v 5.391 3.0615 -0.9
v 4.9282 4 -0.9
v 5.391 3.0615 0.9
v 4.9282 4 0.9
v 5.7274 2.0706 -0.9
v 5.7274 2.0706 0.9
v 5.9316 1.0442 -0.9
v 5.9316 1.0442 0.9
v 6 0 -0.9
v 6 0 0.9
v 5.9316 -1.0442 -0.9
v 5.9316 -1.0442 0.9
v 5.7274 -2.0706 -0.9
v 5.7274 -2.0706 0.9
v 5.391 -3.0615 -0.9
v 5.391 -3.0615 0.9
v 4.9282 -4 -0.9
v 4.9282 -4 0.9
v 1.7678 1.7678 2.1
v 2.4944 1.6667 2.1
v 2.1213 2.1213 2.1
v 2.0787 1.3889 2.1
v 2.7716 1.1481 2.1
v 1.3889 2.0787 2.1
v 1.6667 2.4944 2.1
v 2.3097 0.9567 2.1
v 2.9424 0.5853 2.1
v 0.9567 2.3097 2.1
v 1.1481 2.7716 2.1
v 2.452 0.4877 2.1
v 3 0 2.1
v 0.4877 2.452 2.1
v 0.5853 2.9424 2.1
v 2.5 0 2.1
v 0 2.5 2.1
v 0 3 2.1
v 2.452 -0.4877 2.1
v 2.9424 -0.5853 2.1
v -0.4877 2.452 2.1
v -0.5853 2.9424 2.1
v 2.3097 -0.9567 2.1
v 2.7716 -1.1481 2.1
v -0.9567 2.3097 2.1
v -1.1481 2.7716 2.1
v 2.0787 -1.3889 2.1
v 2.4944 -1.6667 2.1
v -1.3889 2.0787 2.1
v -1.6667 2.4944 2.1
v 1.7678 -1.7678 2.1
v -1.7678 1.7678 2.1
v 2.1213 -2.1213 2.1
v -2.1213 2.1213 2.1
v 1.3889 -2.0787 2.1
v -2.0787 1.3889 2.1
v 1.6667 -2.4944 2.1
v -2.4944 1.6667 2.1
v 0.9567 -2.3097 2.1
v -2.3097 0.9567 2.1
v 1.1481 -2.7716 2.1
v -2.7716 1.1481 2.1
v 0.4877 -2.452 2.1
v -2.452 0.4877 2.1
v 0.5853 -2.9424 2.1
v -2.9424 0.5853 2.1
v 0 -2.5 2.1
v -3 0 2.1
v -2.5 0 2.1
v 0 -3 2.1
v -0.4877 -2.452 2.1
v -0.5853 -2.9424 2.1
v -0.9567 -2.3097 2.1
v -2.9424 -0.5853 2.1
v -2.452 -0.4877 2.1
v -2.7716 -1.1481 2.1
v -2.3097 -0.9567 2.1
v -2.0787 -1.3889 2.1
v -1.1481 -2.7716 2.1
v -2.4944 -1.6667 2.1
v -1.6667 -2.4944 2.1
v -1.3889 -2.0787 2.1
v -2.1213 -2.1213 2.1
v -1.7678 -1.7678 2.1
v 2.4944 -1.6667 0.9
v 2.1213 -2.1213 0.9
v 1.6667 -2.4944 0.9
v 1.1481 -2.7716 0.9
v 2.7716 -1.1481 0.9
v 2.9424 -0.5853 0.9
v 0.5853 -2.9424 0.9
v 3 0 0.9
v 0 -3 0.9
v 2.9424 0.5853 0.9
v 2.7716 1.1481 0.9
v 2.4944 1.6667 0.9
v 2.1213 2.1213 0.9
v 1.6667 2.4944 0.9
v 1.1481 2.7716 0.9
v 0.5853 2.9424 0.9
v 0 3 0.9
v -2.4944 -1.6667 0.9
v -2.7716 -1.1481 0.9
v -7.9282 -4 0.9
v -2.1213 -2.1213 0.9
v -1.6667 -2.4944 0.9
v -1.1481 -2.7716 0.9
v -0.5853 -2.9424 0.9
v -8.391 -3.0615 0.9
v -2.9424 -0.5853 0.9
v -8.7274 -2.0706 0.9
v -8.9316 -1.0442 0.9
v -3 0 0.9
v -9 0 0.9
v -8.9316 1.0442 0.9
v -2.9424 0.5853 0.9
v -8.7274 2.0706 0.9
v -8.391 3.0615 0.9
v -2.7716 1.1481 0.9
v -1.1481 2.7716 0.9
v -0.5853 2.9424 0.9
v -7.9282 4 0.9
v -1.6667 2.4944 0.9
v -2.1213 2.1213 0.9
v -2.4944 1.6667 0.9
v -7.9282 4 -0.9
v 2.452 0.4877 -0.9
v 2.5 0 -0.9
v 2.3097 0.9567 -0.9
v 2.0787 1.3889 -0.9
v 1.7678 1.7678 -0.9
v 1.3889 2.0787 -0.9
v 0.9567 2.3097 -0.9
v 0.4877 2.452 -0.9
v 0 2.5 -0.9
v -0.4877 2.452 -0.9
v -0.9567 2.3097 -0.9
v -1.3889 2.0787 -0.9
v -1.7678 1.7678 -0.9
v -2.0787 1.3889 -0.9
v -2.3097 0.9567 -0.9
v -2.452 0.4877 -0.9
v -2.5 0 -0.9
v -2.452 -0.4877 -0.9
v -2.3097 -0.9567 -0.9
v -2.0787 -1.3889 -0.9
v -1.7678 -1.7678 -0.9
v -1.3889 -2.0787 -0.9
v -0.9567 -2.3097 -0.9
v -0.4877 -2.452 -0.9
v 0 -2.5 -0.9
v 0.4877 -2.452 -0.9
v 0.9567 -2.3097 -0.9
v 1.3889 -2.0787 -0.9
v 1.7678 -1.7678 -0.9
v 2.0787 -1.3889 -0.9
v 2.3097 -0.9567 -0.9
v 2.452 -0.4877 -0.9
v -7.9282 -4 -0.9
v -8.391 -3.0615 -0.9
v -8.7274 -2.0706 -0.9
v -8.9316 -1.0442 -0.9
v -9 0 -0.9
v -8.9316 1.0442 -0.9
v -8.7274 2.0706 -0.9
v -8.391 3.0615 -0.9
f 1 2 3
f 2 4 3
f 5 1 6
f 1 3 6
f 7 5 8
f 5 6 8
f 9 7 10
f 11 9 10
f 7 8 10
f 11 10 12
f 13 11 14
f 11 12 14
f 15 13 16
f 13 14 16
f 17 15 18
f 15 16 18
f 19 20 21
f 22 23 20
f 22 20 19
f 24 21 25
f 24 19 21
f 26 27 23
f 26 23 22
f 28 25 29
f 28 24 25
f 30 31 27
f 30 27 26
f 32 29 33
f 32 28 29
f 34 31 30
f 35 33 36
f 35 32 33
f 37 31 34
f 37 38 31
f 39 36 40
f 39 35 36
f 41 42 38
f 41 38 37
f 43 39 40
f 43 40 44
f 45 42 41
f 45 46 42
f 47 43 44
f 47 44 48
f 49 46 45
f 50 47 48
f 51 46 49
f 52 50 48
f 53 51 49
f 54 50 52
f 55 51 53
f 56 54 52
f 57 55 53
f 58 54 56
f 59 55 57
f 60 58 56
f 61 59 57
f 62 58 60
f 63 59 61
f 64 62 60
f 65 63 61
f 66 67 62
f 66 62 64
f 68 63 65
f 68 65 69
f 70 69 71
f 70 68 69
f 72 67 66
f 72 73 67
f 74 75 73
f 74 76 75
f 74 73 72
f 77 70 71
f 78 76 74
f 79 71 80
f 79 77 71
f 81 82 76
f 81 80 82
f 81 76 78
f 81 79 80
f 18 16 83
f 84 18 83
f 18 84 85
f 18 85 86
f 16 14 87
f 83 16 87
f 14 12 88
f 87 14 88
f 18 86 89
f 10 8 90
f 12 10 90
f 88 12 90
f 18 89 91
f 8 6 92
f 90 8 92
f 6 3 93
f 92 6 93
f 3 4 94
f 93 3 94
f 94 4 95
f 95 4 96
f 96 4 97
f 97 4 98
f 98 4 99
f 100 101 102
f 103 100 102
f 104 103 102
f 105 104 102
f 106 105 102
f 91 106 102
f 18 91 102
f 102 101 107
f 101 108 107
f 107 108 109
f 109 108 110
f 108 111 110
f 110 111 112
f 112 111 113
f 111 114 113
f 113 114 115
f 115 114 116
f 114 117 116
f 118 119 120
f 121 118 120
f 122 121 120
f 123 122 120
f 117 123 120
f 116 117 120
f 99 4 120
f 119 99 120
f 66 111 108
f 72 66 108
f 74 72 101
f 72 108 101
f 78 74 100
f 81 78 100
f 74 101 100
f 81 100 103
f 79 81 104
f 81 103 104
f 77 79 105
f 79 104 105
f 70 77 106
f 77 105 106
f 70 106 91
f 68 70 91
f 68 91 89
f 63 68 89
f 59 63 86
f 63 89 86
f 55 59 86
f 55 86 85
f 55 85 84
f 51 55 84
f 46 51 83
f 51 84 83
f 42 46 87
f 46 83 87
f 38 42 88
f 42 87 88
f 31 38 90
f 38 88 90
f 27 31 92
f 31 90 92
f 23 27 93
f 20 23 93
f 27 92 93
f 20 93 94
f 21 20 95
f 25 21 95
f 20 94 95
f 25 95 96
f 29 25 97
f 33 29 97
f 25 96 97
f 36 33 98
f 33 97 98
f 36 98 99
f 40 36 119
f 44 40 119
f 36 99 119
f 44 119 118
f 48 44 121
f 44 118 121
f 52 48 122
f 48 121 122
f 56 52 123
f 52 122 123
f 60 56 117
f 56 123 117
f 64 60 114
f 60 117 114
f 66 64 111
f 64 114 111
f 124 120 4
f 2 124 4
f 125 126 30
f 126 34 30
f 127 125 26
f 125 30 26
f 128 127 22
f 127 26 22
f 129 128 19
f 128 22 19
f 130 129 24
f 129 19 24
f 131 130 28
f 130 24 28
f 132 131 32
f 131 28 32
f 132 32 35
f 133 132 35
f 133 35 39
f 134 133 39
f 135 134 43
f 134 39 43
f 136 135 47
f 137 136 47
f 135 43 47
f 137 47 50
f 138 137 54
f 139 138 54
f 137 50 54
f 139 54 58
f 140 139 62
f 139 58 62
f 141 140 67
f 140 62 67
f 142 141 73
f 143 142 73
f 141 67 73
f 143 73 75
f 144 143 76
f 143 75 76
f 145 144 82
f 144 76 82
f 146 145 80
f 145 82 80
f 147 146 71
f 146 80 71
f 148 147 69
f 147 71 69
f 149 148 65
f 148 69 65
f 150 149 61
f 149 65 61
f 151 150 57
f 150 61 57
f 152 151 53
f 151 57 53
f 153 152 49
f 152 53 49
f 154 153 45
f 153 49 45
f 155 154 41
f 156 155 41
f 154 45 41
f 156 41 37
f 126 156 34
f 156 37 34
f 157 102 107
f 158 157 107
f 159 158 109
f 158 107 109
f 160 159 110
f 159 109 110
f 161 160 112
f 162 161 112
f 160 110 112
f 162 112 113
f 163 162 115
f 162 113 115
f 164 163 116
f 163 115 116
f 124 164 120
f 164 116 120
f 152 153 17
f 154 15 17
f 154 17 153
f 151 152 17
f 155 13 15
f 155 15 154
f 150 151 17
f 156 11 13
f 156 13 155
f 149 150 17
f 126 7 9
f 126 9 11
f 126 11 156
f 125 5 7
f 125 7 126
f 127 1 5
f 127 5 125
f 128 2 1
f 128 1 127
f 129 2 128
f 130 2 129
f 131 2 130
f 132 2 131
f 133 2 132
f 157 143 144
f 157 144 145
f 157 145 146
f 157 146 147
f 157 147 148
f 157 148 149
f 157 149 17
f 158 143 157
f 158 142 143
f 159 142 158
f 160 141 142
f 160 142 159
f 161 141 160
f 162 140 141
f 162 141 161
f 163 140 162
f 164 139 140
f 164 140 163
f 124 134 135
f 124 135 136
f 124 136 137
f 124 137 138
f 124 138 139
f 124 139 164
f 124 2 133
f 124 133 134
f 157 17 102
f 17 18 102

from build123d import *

# Parameters (mm, degrees)
BOSS_EXTRUDE1_DEPTH     = 0.9
SKETCH8_R               = 3
SKETCH8_R_2             = 2.5
BOSS_EXTRUDE2_DEPTH     = 1.2
CUT_EXTRUDE1_DEPTH      = 11.070253224
CUT_EXTRUDE1_DEPTH_BACK = 11.070253224
SKETCH1_R               = 2.5


with BuildPart() as part:
    # Sketch7 → Boss-Extrude1 (new, symmetric)
    with BuildSketch(Plane.XY):
        with BuildLine():
            Line((-7.92820323, 4), (4.92820323, 4))
            ThreePointArc((4.92820323, 4), (6, 0), (4.92820323, -4))
            Line((4.92820323, -4), (-7.92820323, -4))
            ThreePointArc((-7.92820323, -4), (-9, 0), (-7.92820323, 4))
        make_face()
    extrude(amount=BOSS_EXTRUDE1_DEPTH, both=True)

    # Sketch8 → Boss-Extrude2 (add)
    with BuildSketch(Plane.XY.offset(0.9)):
        Circle(SKETCH8_R)
        Circle(SKETCH8_R_2, mode=Mode.SUBTRACT)
    extrude(amount=BOSS_EXTRUDE2_DEPTH)

    # Sketch1 → Cut-Extrude1 (cut, two sides: drawn at the far end of the back side and taken through both)
    with BuildSketch(Plane.XY.offset(-CUT_EXTRUDE1_DEPTH_BACK)):
        Circle(SKETCH1_R)
    extrude(amount=CUT_EXTRUDE1_DEPTH + CUT_EXTRUDE1_DEPTH_BACK, mode=Mode.SUBTRACT)


solid = part.part
